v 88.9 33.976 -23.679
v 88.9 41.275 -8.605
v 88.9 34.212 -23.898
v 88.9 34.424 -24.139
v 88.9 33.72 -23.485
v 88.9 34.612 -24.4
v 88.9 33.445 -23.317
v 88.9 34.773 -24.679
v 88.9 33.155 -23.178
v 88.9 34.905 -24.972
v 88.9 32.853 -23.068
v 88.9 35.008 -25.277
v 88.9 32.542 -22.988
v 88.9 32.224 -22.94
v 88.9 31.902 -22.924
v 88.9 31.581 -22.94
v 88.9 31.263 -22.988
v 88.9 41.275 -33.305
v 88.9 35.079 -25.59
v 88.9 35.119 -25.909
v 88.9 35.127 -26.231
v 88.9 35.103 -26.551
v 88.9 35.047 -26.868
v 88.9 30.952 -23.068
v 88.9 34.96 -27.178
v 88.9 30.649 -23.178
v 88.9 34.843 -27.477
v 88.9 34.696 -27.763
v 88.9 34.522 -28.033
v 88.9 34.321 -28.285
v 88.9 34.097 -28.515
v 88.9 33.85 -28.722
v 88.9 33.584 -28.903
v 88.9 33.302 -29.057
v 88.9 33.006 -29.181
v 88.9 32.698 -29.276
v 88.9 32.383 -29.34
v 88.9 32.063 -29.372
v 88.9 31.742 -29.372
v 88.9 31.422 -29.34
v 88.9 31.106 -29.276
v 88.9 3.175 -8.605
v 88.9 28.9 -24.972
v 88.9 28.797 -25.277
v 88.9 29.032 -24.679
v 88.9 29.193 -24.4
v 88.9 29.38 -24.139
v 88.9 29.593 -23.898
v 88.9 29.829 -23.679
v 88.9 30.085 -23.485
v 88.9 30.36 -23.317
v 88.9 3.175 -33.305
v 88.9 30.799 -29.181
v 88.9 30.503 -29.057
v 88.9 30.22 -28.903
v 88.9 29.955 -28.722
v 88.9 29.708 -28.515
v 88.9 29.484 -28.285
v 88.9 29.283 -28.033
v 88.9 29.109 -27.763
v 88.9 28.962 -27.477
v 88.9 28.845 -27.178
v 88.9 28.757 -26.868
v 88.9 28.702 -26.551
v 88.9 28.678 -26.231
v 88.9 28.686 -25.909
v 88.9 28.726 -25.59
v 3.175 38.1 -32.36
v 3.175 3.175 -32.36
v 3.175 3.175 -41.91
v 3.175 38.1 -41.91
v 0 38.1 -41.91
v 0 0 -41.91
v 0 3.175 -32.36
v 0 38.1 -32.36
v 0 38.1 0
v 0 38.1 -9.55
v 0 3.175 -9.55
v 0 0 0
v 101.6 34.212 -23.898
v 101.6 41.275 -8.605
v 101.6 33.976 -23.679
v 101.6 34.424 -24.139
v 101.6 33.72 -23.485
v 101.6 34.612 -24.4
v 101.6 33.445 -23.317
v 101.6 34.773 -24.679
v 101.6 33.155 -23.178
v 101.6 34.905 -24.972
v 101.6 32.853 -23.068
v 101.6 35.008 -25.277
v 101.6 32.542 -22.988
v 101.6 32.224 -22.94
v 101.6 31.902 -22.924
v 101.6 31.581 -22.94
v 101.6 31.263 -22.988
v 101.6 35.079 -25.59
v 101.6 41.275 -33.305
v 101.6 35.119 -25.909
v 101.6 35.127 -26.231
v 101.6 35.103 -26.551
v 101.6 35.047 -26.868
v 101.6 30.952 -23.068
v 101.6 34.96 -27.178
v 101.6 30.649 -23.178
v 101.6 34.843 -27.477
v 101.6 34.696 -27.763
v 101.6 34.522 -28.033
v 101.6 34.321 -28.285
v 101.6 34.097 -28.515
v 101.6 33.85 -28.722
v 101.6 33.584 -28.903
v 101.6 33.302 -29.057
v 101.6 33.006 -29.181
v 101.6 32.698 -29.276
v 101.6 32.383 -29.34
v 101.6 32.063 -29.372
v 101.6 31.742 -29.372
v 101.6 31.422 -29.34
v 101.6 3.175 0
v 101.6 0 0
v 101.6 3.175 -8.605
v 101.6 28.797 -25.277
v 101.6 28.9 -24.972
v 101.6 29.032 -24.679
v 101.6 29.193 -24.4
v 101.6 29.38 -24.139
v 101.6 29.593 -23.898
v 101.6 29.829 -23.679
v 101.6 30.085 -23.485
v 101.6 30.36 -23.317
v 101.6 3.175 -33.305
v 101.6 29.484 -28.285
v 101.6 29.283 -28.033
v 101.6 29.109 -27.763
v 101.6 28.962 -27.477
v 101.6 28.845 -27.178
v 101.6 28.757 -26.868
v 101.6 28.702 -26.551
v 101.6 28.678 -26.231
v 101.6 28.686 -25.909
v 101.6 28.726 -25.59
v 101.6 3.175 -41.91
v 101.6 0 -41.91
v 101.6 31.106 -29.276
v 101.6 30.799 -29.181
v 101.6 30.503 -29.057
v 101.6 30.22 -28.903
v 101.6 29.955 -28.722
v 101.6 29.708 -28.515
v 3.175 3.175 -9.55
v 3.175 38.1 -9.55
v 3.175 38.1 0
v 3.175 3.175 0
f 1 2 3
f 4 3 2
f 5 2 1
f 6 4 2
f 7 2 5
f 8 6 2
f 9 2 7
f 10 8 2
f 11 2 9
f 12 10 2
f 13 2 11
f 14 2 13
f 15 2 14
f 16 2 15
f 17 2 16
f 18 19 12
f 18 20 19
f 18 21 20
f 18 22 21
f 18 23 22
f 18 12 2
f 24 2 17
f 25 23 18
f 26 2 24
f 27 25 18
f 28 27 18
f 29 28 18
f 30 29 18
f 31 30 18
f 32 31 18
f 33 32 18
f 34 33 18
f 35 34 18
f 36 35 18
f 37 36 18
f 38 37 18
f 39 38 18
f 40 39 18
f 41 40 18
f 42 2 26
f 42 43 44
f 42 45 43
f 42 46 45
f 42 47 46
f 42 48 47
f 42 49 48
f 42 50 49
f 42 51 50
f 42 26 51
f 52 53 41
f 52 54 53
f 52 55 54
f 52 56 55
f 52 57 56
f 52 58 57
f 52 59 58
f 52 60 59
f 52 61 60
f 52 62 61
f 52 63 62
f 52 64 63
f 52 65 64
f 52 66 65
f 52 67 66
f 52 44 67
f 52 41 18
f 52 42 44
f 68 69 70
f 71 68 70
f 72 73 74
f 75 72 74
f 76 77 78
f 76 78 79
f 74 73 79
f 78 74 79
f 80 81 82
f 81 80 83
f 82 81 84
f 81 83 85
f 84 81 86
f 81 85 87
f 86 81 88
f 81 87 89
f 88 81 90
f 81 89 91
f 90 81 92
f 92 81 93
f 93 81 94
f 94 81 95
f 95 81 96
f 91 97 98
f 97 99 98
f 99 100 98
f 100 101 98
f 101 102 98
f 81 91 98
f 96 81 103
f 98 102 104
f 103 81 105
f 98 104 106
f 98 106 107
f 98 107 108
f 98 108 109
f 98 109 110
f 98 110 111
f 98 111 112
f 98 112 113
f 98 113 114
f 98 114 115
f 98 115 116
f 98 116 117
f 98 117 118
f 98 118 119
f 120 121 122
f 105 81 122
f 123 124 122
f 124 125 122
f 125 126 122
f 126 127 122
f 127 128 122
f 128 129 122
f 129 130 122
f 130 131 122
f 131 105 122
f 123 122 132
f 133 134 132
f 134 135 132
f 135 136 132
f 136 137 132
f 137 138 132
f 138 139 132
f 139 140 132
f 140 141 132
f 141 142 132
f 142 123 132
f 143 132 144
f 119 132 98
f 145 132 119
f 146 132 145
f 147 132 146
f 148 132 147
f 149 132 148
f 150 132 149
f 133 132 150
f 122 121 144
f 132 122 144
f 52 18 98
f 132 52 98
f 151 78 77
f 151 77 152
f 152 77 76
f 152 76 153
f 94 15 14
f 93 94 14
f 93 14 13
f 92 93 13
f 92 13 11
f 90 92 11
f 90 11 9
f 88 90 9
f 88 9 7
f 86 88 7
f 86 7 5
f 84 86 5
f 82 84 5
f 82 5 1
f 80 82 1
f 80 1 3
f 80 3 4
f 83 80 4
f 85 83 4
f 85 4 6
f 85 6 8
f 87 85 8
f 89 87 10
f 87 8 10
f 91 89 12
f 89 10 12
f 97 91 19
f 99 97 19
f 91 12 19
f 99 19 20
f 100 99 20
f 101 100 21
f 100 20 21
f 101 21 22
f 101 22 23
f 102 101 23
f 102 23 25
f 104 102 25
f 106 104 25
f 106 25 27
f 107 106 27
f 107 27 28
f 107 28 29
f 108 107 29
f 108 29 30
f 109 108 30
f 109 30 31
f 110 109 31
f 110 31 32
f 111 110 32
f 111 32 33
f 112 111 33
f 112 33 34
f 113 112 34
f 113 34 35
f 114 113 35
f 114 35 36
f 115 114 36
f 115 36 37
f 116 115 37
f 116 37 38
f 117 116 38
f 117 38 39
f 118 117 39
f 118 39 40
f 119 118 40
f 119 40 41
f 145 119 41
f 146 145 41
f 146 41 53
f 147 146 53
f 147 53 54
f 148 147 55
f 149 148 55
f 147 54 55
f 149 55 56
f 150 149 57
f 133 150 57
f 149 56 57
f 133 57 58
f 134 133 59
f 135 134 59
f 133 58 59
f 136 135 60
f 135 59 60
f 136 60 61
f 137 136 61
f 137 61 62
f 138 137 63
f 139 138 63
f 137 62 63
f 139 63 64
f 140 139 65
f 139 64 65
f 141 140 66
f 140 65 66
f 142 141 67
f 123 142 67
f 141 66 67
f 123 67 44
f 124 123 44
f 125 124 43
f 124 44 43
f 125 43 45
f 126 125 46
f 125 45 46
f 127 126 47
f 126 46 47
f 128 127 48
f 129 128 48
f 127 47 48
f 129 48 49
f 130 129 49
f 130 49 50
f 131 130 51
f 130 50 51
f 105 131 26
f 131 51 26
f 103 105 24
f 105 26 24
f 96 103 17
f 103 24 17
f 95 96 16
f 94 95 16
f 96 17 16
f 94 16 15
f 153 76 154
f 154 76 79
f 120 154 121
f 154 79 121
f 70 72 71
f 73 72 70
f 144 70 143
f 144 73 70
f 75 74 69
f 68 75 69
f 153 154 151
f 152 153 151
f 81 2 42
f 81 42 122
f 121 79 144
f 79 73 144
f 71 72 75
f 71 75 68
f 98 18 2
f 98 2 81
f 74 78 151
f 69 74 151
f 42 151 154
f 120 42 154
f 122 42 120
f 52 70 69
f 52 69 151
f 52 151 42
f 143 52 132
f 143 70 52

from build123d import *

# Parameters (mm, degrees)
SKETCH2_W             = 3.175
SKETCH2_H             = 9.5504
BOSS_EXTRUDE5_DEPTH   = 38.1
BOSS_EXTRUDE5_2_DEPTH = 38.1
BOSS_EXTRUDE6_DEPTH   = 3.175
SKETCH3_W             = 12.7
SKETCH3_H             = 24.700794202
BOSS_EXTRUDE7_DEPTH   = 38.1
SKETCH4_R             = 3.2258
CUT_EXTRUDE1_DEPTH    = 30.48


with BuildPart() as part:
    # Sketch2 → Boss-Extrude5 (new body)
    with BuildSketch(Plane(origin=(0, 0, 0), x_dir=(1, 0, 0), z_dir=(0, 1, 0))):
        with Locations((1.5875, 4.7752)):
            Rectangle(SKETCH2_W, SKETCH2_H)
    extrude(amount=BOSS_EXTRUDE5_DEPTH)



with BuildPart() as body_2:
    # Sketch2 → Boss-Extrude5 2 (new body)
    with BuildSketch(Plane(origin=(0, 0, 0), x_dir=(1, 0, 0), z_dir=(0, 1, 0))):
        with Locations((1.5875, 37.1348)):
            Rectangle(SKETCH2_W, SKETCH2_H)
    extrude(amount=BOSS_EXTRUDE5_2_DEPTH)


with BuildPart() as part_1:
    add(part.part)

    add(body_2.part)  # Boss-Extrude6 merges body 2
    # Sketch2<11> → Boss-Extrude6 (add)
    with BuildSketch(Plane(origin=(0, 0, 0), x_dir=(1, 0, 0), z_dir=(0, 1, 0))):
        Polygon((0, 32.3596), (0, 20.955), (0, 9.5504), (3.175, 9.5504), (3.175, 0), (101.6, 0), (101.6, 41.91), (3.175, 41.91), (3.175, 32.3596), align=None)
    extrude(amount=BOSS_EXTRUDE6_DEPTH)

    # Sketch3 → Boss-Extrude7 (add)
    with BuildSketch(Plane(origin=(0, 3.175, 0), x_dir=(1, 0, 0), z_dir=(0, 1, 0))):
        with Locations((95.25, 20.955)):
            Rectangle(SKETCH3_W, SKETCH3_H)
    extrude(amount=BOSS_EXTRUDE7_DEPTH)

    # Sketch4 → Cut-Extrude1 (cut)
    with BuildSketch(Plane.ZY.offset(-88.9)):
        with Locations((-26.150217101, 31.9024)):
            Circle(SKETCH4_R)
    extrude(amount=-CUT_EXTRUDE1_DEPTH, mode=Mode.SUBTRACT)


solid = part_1.part
